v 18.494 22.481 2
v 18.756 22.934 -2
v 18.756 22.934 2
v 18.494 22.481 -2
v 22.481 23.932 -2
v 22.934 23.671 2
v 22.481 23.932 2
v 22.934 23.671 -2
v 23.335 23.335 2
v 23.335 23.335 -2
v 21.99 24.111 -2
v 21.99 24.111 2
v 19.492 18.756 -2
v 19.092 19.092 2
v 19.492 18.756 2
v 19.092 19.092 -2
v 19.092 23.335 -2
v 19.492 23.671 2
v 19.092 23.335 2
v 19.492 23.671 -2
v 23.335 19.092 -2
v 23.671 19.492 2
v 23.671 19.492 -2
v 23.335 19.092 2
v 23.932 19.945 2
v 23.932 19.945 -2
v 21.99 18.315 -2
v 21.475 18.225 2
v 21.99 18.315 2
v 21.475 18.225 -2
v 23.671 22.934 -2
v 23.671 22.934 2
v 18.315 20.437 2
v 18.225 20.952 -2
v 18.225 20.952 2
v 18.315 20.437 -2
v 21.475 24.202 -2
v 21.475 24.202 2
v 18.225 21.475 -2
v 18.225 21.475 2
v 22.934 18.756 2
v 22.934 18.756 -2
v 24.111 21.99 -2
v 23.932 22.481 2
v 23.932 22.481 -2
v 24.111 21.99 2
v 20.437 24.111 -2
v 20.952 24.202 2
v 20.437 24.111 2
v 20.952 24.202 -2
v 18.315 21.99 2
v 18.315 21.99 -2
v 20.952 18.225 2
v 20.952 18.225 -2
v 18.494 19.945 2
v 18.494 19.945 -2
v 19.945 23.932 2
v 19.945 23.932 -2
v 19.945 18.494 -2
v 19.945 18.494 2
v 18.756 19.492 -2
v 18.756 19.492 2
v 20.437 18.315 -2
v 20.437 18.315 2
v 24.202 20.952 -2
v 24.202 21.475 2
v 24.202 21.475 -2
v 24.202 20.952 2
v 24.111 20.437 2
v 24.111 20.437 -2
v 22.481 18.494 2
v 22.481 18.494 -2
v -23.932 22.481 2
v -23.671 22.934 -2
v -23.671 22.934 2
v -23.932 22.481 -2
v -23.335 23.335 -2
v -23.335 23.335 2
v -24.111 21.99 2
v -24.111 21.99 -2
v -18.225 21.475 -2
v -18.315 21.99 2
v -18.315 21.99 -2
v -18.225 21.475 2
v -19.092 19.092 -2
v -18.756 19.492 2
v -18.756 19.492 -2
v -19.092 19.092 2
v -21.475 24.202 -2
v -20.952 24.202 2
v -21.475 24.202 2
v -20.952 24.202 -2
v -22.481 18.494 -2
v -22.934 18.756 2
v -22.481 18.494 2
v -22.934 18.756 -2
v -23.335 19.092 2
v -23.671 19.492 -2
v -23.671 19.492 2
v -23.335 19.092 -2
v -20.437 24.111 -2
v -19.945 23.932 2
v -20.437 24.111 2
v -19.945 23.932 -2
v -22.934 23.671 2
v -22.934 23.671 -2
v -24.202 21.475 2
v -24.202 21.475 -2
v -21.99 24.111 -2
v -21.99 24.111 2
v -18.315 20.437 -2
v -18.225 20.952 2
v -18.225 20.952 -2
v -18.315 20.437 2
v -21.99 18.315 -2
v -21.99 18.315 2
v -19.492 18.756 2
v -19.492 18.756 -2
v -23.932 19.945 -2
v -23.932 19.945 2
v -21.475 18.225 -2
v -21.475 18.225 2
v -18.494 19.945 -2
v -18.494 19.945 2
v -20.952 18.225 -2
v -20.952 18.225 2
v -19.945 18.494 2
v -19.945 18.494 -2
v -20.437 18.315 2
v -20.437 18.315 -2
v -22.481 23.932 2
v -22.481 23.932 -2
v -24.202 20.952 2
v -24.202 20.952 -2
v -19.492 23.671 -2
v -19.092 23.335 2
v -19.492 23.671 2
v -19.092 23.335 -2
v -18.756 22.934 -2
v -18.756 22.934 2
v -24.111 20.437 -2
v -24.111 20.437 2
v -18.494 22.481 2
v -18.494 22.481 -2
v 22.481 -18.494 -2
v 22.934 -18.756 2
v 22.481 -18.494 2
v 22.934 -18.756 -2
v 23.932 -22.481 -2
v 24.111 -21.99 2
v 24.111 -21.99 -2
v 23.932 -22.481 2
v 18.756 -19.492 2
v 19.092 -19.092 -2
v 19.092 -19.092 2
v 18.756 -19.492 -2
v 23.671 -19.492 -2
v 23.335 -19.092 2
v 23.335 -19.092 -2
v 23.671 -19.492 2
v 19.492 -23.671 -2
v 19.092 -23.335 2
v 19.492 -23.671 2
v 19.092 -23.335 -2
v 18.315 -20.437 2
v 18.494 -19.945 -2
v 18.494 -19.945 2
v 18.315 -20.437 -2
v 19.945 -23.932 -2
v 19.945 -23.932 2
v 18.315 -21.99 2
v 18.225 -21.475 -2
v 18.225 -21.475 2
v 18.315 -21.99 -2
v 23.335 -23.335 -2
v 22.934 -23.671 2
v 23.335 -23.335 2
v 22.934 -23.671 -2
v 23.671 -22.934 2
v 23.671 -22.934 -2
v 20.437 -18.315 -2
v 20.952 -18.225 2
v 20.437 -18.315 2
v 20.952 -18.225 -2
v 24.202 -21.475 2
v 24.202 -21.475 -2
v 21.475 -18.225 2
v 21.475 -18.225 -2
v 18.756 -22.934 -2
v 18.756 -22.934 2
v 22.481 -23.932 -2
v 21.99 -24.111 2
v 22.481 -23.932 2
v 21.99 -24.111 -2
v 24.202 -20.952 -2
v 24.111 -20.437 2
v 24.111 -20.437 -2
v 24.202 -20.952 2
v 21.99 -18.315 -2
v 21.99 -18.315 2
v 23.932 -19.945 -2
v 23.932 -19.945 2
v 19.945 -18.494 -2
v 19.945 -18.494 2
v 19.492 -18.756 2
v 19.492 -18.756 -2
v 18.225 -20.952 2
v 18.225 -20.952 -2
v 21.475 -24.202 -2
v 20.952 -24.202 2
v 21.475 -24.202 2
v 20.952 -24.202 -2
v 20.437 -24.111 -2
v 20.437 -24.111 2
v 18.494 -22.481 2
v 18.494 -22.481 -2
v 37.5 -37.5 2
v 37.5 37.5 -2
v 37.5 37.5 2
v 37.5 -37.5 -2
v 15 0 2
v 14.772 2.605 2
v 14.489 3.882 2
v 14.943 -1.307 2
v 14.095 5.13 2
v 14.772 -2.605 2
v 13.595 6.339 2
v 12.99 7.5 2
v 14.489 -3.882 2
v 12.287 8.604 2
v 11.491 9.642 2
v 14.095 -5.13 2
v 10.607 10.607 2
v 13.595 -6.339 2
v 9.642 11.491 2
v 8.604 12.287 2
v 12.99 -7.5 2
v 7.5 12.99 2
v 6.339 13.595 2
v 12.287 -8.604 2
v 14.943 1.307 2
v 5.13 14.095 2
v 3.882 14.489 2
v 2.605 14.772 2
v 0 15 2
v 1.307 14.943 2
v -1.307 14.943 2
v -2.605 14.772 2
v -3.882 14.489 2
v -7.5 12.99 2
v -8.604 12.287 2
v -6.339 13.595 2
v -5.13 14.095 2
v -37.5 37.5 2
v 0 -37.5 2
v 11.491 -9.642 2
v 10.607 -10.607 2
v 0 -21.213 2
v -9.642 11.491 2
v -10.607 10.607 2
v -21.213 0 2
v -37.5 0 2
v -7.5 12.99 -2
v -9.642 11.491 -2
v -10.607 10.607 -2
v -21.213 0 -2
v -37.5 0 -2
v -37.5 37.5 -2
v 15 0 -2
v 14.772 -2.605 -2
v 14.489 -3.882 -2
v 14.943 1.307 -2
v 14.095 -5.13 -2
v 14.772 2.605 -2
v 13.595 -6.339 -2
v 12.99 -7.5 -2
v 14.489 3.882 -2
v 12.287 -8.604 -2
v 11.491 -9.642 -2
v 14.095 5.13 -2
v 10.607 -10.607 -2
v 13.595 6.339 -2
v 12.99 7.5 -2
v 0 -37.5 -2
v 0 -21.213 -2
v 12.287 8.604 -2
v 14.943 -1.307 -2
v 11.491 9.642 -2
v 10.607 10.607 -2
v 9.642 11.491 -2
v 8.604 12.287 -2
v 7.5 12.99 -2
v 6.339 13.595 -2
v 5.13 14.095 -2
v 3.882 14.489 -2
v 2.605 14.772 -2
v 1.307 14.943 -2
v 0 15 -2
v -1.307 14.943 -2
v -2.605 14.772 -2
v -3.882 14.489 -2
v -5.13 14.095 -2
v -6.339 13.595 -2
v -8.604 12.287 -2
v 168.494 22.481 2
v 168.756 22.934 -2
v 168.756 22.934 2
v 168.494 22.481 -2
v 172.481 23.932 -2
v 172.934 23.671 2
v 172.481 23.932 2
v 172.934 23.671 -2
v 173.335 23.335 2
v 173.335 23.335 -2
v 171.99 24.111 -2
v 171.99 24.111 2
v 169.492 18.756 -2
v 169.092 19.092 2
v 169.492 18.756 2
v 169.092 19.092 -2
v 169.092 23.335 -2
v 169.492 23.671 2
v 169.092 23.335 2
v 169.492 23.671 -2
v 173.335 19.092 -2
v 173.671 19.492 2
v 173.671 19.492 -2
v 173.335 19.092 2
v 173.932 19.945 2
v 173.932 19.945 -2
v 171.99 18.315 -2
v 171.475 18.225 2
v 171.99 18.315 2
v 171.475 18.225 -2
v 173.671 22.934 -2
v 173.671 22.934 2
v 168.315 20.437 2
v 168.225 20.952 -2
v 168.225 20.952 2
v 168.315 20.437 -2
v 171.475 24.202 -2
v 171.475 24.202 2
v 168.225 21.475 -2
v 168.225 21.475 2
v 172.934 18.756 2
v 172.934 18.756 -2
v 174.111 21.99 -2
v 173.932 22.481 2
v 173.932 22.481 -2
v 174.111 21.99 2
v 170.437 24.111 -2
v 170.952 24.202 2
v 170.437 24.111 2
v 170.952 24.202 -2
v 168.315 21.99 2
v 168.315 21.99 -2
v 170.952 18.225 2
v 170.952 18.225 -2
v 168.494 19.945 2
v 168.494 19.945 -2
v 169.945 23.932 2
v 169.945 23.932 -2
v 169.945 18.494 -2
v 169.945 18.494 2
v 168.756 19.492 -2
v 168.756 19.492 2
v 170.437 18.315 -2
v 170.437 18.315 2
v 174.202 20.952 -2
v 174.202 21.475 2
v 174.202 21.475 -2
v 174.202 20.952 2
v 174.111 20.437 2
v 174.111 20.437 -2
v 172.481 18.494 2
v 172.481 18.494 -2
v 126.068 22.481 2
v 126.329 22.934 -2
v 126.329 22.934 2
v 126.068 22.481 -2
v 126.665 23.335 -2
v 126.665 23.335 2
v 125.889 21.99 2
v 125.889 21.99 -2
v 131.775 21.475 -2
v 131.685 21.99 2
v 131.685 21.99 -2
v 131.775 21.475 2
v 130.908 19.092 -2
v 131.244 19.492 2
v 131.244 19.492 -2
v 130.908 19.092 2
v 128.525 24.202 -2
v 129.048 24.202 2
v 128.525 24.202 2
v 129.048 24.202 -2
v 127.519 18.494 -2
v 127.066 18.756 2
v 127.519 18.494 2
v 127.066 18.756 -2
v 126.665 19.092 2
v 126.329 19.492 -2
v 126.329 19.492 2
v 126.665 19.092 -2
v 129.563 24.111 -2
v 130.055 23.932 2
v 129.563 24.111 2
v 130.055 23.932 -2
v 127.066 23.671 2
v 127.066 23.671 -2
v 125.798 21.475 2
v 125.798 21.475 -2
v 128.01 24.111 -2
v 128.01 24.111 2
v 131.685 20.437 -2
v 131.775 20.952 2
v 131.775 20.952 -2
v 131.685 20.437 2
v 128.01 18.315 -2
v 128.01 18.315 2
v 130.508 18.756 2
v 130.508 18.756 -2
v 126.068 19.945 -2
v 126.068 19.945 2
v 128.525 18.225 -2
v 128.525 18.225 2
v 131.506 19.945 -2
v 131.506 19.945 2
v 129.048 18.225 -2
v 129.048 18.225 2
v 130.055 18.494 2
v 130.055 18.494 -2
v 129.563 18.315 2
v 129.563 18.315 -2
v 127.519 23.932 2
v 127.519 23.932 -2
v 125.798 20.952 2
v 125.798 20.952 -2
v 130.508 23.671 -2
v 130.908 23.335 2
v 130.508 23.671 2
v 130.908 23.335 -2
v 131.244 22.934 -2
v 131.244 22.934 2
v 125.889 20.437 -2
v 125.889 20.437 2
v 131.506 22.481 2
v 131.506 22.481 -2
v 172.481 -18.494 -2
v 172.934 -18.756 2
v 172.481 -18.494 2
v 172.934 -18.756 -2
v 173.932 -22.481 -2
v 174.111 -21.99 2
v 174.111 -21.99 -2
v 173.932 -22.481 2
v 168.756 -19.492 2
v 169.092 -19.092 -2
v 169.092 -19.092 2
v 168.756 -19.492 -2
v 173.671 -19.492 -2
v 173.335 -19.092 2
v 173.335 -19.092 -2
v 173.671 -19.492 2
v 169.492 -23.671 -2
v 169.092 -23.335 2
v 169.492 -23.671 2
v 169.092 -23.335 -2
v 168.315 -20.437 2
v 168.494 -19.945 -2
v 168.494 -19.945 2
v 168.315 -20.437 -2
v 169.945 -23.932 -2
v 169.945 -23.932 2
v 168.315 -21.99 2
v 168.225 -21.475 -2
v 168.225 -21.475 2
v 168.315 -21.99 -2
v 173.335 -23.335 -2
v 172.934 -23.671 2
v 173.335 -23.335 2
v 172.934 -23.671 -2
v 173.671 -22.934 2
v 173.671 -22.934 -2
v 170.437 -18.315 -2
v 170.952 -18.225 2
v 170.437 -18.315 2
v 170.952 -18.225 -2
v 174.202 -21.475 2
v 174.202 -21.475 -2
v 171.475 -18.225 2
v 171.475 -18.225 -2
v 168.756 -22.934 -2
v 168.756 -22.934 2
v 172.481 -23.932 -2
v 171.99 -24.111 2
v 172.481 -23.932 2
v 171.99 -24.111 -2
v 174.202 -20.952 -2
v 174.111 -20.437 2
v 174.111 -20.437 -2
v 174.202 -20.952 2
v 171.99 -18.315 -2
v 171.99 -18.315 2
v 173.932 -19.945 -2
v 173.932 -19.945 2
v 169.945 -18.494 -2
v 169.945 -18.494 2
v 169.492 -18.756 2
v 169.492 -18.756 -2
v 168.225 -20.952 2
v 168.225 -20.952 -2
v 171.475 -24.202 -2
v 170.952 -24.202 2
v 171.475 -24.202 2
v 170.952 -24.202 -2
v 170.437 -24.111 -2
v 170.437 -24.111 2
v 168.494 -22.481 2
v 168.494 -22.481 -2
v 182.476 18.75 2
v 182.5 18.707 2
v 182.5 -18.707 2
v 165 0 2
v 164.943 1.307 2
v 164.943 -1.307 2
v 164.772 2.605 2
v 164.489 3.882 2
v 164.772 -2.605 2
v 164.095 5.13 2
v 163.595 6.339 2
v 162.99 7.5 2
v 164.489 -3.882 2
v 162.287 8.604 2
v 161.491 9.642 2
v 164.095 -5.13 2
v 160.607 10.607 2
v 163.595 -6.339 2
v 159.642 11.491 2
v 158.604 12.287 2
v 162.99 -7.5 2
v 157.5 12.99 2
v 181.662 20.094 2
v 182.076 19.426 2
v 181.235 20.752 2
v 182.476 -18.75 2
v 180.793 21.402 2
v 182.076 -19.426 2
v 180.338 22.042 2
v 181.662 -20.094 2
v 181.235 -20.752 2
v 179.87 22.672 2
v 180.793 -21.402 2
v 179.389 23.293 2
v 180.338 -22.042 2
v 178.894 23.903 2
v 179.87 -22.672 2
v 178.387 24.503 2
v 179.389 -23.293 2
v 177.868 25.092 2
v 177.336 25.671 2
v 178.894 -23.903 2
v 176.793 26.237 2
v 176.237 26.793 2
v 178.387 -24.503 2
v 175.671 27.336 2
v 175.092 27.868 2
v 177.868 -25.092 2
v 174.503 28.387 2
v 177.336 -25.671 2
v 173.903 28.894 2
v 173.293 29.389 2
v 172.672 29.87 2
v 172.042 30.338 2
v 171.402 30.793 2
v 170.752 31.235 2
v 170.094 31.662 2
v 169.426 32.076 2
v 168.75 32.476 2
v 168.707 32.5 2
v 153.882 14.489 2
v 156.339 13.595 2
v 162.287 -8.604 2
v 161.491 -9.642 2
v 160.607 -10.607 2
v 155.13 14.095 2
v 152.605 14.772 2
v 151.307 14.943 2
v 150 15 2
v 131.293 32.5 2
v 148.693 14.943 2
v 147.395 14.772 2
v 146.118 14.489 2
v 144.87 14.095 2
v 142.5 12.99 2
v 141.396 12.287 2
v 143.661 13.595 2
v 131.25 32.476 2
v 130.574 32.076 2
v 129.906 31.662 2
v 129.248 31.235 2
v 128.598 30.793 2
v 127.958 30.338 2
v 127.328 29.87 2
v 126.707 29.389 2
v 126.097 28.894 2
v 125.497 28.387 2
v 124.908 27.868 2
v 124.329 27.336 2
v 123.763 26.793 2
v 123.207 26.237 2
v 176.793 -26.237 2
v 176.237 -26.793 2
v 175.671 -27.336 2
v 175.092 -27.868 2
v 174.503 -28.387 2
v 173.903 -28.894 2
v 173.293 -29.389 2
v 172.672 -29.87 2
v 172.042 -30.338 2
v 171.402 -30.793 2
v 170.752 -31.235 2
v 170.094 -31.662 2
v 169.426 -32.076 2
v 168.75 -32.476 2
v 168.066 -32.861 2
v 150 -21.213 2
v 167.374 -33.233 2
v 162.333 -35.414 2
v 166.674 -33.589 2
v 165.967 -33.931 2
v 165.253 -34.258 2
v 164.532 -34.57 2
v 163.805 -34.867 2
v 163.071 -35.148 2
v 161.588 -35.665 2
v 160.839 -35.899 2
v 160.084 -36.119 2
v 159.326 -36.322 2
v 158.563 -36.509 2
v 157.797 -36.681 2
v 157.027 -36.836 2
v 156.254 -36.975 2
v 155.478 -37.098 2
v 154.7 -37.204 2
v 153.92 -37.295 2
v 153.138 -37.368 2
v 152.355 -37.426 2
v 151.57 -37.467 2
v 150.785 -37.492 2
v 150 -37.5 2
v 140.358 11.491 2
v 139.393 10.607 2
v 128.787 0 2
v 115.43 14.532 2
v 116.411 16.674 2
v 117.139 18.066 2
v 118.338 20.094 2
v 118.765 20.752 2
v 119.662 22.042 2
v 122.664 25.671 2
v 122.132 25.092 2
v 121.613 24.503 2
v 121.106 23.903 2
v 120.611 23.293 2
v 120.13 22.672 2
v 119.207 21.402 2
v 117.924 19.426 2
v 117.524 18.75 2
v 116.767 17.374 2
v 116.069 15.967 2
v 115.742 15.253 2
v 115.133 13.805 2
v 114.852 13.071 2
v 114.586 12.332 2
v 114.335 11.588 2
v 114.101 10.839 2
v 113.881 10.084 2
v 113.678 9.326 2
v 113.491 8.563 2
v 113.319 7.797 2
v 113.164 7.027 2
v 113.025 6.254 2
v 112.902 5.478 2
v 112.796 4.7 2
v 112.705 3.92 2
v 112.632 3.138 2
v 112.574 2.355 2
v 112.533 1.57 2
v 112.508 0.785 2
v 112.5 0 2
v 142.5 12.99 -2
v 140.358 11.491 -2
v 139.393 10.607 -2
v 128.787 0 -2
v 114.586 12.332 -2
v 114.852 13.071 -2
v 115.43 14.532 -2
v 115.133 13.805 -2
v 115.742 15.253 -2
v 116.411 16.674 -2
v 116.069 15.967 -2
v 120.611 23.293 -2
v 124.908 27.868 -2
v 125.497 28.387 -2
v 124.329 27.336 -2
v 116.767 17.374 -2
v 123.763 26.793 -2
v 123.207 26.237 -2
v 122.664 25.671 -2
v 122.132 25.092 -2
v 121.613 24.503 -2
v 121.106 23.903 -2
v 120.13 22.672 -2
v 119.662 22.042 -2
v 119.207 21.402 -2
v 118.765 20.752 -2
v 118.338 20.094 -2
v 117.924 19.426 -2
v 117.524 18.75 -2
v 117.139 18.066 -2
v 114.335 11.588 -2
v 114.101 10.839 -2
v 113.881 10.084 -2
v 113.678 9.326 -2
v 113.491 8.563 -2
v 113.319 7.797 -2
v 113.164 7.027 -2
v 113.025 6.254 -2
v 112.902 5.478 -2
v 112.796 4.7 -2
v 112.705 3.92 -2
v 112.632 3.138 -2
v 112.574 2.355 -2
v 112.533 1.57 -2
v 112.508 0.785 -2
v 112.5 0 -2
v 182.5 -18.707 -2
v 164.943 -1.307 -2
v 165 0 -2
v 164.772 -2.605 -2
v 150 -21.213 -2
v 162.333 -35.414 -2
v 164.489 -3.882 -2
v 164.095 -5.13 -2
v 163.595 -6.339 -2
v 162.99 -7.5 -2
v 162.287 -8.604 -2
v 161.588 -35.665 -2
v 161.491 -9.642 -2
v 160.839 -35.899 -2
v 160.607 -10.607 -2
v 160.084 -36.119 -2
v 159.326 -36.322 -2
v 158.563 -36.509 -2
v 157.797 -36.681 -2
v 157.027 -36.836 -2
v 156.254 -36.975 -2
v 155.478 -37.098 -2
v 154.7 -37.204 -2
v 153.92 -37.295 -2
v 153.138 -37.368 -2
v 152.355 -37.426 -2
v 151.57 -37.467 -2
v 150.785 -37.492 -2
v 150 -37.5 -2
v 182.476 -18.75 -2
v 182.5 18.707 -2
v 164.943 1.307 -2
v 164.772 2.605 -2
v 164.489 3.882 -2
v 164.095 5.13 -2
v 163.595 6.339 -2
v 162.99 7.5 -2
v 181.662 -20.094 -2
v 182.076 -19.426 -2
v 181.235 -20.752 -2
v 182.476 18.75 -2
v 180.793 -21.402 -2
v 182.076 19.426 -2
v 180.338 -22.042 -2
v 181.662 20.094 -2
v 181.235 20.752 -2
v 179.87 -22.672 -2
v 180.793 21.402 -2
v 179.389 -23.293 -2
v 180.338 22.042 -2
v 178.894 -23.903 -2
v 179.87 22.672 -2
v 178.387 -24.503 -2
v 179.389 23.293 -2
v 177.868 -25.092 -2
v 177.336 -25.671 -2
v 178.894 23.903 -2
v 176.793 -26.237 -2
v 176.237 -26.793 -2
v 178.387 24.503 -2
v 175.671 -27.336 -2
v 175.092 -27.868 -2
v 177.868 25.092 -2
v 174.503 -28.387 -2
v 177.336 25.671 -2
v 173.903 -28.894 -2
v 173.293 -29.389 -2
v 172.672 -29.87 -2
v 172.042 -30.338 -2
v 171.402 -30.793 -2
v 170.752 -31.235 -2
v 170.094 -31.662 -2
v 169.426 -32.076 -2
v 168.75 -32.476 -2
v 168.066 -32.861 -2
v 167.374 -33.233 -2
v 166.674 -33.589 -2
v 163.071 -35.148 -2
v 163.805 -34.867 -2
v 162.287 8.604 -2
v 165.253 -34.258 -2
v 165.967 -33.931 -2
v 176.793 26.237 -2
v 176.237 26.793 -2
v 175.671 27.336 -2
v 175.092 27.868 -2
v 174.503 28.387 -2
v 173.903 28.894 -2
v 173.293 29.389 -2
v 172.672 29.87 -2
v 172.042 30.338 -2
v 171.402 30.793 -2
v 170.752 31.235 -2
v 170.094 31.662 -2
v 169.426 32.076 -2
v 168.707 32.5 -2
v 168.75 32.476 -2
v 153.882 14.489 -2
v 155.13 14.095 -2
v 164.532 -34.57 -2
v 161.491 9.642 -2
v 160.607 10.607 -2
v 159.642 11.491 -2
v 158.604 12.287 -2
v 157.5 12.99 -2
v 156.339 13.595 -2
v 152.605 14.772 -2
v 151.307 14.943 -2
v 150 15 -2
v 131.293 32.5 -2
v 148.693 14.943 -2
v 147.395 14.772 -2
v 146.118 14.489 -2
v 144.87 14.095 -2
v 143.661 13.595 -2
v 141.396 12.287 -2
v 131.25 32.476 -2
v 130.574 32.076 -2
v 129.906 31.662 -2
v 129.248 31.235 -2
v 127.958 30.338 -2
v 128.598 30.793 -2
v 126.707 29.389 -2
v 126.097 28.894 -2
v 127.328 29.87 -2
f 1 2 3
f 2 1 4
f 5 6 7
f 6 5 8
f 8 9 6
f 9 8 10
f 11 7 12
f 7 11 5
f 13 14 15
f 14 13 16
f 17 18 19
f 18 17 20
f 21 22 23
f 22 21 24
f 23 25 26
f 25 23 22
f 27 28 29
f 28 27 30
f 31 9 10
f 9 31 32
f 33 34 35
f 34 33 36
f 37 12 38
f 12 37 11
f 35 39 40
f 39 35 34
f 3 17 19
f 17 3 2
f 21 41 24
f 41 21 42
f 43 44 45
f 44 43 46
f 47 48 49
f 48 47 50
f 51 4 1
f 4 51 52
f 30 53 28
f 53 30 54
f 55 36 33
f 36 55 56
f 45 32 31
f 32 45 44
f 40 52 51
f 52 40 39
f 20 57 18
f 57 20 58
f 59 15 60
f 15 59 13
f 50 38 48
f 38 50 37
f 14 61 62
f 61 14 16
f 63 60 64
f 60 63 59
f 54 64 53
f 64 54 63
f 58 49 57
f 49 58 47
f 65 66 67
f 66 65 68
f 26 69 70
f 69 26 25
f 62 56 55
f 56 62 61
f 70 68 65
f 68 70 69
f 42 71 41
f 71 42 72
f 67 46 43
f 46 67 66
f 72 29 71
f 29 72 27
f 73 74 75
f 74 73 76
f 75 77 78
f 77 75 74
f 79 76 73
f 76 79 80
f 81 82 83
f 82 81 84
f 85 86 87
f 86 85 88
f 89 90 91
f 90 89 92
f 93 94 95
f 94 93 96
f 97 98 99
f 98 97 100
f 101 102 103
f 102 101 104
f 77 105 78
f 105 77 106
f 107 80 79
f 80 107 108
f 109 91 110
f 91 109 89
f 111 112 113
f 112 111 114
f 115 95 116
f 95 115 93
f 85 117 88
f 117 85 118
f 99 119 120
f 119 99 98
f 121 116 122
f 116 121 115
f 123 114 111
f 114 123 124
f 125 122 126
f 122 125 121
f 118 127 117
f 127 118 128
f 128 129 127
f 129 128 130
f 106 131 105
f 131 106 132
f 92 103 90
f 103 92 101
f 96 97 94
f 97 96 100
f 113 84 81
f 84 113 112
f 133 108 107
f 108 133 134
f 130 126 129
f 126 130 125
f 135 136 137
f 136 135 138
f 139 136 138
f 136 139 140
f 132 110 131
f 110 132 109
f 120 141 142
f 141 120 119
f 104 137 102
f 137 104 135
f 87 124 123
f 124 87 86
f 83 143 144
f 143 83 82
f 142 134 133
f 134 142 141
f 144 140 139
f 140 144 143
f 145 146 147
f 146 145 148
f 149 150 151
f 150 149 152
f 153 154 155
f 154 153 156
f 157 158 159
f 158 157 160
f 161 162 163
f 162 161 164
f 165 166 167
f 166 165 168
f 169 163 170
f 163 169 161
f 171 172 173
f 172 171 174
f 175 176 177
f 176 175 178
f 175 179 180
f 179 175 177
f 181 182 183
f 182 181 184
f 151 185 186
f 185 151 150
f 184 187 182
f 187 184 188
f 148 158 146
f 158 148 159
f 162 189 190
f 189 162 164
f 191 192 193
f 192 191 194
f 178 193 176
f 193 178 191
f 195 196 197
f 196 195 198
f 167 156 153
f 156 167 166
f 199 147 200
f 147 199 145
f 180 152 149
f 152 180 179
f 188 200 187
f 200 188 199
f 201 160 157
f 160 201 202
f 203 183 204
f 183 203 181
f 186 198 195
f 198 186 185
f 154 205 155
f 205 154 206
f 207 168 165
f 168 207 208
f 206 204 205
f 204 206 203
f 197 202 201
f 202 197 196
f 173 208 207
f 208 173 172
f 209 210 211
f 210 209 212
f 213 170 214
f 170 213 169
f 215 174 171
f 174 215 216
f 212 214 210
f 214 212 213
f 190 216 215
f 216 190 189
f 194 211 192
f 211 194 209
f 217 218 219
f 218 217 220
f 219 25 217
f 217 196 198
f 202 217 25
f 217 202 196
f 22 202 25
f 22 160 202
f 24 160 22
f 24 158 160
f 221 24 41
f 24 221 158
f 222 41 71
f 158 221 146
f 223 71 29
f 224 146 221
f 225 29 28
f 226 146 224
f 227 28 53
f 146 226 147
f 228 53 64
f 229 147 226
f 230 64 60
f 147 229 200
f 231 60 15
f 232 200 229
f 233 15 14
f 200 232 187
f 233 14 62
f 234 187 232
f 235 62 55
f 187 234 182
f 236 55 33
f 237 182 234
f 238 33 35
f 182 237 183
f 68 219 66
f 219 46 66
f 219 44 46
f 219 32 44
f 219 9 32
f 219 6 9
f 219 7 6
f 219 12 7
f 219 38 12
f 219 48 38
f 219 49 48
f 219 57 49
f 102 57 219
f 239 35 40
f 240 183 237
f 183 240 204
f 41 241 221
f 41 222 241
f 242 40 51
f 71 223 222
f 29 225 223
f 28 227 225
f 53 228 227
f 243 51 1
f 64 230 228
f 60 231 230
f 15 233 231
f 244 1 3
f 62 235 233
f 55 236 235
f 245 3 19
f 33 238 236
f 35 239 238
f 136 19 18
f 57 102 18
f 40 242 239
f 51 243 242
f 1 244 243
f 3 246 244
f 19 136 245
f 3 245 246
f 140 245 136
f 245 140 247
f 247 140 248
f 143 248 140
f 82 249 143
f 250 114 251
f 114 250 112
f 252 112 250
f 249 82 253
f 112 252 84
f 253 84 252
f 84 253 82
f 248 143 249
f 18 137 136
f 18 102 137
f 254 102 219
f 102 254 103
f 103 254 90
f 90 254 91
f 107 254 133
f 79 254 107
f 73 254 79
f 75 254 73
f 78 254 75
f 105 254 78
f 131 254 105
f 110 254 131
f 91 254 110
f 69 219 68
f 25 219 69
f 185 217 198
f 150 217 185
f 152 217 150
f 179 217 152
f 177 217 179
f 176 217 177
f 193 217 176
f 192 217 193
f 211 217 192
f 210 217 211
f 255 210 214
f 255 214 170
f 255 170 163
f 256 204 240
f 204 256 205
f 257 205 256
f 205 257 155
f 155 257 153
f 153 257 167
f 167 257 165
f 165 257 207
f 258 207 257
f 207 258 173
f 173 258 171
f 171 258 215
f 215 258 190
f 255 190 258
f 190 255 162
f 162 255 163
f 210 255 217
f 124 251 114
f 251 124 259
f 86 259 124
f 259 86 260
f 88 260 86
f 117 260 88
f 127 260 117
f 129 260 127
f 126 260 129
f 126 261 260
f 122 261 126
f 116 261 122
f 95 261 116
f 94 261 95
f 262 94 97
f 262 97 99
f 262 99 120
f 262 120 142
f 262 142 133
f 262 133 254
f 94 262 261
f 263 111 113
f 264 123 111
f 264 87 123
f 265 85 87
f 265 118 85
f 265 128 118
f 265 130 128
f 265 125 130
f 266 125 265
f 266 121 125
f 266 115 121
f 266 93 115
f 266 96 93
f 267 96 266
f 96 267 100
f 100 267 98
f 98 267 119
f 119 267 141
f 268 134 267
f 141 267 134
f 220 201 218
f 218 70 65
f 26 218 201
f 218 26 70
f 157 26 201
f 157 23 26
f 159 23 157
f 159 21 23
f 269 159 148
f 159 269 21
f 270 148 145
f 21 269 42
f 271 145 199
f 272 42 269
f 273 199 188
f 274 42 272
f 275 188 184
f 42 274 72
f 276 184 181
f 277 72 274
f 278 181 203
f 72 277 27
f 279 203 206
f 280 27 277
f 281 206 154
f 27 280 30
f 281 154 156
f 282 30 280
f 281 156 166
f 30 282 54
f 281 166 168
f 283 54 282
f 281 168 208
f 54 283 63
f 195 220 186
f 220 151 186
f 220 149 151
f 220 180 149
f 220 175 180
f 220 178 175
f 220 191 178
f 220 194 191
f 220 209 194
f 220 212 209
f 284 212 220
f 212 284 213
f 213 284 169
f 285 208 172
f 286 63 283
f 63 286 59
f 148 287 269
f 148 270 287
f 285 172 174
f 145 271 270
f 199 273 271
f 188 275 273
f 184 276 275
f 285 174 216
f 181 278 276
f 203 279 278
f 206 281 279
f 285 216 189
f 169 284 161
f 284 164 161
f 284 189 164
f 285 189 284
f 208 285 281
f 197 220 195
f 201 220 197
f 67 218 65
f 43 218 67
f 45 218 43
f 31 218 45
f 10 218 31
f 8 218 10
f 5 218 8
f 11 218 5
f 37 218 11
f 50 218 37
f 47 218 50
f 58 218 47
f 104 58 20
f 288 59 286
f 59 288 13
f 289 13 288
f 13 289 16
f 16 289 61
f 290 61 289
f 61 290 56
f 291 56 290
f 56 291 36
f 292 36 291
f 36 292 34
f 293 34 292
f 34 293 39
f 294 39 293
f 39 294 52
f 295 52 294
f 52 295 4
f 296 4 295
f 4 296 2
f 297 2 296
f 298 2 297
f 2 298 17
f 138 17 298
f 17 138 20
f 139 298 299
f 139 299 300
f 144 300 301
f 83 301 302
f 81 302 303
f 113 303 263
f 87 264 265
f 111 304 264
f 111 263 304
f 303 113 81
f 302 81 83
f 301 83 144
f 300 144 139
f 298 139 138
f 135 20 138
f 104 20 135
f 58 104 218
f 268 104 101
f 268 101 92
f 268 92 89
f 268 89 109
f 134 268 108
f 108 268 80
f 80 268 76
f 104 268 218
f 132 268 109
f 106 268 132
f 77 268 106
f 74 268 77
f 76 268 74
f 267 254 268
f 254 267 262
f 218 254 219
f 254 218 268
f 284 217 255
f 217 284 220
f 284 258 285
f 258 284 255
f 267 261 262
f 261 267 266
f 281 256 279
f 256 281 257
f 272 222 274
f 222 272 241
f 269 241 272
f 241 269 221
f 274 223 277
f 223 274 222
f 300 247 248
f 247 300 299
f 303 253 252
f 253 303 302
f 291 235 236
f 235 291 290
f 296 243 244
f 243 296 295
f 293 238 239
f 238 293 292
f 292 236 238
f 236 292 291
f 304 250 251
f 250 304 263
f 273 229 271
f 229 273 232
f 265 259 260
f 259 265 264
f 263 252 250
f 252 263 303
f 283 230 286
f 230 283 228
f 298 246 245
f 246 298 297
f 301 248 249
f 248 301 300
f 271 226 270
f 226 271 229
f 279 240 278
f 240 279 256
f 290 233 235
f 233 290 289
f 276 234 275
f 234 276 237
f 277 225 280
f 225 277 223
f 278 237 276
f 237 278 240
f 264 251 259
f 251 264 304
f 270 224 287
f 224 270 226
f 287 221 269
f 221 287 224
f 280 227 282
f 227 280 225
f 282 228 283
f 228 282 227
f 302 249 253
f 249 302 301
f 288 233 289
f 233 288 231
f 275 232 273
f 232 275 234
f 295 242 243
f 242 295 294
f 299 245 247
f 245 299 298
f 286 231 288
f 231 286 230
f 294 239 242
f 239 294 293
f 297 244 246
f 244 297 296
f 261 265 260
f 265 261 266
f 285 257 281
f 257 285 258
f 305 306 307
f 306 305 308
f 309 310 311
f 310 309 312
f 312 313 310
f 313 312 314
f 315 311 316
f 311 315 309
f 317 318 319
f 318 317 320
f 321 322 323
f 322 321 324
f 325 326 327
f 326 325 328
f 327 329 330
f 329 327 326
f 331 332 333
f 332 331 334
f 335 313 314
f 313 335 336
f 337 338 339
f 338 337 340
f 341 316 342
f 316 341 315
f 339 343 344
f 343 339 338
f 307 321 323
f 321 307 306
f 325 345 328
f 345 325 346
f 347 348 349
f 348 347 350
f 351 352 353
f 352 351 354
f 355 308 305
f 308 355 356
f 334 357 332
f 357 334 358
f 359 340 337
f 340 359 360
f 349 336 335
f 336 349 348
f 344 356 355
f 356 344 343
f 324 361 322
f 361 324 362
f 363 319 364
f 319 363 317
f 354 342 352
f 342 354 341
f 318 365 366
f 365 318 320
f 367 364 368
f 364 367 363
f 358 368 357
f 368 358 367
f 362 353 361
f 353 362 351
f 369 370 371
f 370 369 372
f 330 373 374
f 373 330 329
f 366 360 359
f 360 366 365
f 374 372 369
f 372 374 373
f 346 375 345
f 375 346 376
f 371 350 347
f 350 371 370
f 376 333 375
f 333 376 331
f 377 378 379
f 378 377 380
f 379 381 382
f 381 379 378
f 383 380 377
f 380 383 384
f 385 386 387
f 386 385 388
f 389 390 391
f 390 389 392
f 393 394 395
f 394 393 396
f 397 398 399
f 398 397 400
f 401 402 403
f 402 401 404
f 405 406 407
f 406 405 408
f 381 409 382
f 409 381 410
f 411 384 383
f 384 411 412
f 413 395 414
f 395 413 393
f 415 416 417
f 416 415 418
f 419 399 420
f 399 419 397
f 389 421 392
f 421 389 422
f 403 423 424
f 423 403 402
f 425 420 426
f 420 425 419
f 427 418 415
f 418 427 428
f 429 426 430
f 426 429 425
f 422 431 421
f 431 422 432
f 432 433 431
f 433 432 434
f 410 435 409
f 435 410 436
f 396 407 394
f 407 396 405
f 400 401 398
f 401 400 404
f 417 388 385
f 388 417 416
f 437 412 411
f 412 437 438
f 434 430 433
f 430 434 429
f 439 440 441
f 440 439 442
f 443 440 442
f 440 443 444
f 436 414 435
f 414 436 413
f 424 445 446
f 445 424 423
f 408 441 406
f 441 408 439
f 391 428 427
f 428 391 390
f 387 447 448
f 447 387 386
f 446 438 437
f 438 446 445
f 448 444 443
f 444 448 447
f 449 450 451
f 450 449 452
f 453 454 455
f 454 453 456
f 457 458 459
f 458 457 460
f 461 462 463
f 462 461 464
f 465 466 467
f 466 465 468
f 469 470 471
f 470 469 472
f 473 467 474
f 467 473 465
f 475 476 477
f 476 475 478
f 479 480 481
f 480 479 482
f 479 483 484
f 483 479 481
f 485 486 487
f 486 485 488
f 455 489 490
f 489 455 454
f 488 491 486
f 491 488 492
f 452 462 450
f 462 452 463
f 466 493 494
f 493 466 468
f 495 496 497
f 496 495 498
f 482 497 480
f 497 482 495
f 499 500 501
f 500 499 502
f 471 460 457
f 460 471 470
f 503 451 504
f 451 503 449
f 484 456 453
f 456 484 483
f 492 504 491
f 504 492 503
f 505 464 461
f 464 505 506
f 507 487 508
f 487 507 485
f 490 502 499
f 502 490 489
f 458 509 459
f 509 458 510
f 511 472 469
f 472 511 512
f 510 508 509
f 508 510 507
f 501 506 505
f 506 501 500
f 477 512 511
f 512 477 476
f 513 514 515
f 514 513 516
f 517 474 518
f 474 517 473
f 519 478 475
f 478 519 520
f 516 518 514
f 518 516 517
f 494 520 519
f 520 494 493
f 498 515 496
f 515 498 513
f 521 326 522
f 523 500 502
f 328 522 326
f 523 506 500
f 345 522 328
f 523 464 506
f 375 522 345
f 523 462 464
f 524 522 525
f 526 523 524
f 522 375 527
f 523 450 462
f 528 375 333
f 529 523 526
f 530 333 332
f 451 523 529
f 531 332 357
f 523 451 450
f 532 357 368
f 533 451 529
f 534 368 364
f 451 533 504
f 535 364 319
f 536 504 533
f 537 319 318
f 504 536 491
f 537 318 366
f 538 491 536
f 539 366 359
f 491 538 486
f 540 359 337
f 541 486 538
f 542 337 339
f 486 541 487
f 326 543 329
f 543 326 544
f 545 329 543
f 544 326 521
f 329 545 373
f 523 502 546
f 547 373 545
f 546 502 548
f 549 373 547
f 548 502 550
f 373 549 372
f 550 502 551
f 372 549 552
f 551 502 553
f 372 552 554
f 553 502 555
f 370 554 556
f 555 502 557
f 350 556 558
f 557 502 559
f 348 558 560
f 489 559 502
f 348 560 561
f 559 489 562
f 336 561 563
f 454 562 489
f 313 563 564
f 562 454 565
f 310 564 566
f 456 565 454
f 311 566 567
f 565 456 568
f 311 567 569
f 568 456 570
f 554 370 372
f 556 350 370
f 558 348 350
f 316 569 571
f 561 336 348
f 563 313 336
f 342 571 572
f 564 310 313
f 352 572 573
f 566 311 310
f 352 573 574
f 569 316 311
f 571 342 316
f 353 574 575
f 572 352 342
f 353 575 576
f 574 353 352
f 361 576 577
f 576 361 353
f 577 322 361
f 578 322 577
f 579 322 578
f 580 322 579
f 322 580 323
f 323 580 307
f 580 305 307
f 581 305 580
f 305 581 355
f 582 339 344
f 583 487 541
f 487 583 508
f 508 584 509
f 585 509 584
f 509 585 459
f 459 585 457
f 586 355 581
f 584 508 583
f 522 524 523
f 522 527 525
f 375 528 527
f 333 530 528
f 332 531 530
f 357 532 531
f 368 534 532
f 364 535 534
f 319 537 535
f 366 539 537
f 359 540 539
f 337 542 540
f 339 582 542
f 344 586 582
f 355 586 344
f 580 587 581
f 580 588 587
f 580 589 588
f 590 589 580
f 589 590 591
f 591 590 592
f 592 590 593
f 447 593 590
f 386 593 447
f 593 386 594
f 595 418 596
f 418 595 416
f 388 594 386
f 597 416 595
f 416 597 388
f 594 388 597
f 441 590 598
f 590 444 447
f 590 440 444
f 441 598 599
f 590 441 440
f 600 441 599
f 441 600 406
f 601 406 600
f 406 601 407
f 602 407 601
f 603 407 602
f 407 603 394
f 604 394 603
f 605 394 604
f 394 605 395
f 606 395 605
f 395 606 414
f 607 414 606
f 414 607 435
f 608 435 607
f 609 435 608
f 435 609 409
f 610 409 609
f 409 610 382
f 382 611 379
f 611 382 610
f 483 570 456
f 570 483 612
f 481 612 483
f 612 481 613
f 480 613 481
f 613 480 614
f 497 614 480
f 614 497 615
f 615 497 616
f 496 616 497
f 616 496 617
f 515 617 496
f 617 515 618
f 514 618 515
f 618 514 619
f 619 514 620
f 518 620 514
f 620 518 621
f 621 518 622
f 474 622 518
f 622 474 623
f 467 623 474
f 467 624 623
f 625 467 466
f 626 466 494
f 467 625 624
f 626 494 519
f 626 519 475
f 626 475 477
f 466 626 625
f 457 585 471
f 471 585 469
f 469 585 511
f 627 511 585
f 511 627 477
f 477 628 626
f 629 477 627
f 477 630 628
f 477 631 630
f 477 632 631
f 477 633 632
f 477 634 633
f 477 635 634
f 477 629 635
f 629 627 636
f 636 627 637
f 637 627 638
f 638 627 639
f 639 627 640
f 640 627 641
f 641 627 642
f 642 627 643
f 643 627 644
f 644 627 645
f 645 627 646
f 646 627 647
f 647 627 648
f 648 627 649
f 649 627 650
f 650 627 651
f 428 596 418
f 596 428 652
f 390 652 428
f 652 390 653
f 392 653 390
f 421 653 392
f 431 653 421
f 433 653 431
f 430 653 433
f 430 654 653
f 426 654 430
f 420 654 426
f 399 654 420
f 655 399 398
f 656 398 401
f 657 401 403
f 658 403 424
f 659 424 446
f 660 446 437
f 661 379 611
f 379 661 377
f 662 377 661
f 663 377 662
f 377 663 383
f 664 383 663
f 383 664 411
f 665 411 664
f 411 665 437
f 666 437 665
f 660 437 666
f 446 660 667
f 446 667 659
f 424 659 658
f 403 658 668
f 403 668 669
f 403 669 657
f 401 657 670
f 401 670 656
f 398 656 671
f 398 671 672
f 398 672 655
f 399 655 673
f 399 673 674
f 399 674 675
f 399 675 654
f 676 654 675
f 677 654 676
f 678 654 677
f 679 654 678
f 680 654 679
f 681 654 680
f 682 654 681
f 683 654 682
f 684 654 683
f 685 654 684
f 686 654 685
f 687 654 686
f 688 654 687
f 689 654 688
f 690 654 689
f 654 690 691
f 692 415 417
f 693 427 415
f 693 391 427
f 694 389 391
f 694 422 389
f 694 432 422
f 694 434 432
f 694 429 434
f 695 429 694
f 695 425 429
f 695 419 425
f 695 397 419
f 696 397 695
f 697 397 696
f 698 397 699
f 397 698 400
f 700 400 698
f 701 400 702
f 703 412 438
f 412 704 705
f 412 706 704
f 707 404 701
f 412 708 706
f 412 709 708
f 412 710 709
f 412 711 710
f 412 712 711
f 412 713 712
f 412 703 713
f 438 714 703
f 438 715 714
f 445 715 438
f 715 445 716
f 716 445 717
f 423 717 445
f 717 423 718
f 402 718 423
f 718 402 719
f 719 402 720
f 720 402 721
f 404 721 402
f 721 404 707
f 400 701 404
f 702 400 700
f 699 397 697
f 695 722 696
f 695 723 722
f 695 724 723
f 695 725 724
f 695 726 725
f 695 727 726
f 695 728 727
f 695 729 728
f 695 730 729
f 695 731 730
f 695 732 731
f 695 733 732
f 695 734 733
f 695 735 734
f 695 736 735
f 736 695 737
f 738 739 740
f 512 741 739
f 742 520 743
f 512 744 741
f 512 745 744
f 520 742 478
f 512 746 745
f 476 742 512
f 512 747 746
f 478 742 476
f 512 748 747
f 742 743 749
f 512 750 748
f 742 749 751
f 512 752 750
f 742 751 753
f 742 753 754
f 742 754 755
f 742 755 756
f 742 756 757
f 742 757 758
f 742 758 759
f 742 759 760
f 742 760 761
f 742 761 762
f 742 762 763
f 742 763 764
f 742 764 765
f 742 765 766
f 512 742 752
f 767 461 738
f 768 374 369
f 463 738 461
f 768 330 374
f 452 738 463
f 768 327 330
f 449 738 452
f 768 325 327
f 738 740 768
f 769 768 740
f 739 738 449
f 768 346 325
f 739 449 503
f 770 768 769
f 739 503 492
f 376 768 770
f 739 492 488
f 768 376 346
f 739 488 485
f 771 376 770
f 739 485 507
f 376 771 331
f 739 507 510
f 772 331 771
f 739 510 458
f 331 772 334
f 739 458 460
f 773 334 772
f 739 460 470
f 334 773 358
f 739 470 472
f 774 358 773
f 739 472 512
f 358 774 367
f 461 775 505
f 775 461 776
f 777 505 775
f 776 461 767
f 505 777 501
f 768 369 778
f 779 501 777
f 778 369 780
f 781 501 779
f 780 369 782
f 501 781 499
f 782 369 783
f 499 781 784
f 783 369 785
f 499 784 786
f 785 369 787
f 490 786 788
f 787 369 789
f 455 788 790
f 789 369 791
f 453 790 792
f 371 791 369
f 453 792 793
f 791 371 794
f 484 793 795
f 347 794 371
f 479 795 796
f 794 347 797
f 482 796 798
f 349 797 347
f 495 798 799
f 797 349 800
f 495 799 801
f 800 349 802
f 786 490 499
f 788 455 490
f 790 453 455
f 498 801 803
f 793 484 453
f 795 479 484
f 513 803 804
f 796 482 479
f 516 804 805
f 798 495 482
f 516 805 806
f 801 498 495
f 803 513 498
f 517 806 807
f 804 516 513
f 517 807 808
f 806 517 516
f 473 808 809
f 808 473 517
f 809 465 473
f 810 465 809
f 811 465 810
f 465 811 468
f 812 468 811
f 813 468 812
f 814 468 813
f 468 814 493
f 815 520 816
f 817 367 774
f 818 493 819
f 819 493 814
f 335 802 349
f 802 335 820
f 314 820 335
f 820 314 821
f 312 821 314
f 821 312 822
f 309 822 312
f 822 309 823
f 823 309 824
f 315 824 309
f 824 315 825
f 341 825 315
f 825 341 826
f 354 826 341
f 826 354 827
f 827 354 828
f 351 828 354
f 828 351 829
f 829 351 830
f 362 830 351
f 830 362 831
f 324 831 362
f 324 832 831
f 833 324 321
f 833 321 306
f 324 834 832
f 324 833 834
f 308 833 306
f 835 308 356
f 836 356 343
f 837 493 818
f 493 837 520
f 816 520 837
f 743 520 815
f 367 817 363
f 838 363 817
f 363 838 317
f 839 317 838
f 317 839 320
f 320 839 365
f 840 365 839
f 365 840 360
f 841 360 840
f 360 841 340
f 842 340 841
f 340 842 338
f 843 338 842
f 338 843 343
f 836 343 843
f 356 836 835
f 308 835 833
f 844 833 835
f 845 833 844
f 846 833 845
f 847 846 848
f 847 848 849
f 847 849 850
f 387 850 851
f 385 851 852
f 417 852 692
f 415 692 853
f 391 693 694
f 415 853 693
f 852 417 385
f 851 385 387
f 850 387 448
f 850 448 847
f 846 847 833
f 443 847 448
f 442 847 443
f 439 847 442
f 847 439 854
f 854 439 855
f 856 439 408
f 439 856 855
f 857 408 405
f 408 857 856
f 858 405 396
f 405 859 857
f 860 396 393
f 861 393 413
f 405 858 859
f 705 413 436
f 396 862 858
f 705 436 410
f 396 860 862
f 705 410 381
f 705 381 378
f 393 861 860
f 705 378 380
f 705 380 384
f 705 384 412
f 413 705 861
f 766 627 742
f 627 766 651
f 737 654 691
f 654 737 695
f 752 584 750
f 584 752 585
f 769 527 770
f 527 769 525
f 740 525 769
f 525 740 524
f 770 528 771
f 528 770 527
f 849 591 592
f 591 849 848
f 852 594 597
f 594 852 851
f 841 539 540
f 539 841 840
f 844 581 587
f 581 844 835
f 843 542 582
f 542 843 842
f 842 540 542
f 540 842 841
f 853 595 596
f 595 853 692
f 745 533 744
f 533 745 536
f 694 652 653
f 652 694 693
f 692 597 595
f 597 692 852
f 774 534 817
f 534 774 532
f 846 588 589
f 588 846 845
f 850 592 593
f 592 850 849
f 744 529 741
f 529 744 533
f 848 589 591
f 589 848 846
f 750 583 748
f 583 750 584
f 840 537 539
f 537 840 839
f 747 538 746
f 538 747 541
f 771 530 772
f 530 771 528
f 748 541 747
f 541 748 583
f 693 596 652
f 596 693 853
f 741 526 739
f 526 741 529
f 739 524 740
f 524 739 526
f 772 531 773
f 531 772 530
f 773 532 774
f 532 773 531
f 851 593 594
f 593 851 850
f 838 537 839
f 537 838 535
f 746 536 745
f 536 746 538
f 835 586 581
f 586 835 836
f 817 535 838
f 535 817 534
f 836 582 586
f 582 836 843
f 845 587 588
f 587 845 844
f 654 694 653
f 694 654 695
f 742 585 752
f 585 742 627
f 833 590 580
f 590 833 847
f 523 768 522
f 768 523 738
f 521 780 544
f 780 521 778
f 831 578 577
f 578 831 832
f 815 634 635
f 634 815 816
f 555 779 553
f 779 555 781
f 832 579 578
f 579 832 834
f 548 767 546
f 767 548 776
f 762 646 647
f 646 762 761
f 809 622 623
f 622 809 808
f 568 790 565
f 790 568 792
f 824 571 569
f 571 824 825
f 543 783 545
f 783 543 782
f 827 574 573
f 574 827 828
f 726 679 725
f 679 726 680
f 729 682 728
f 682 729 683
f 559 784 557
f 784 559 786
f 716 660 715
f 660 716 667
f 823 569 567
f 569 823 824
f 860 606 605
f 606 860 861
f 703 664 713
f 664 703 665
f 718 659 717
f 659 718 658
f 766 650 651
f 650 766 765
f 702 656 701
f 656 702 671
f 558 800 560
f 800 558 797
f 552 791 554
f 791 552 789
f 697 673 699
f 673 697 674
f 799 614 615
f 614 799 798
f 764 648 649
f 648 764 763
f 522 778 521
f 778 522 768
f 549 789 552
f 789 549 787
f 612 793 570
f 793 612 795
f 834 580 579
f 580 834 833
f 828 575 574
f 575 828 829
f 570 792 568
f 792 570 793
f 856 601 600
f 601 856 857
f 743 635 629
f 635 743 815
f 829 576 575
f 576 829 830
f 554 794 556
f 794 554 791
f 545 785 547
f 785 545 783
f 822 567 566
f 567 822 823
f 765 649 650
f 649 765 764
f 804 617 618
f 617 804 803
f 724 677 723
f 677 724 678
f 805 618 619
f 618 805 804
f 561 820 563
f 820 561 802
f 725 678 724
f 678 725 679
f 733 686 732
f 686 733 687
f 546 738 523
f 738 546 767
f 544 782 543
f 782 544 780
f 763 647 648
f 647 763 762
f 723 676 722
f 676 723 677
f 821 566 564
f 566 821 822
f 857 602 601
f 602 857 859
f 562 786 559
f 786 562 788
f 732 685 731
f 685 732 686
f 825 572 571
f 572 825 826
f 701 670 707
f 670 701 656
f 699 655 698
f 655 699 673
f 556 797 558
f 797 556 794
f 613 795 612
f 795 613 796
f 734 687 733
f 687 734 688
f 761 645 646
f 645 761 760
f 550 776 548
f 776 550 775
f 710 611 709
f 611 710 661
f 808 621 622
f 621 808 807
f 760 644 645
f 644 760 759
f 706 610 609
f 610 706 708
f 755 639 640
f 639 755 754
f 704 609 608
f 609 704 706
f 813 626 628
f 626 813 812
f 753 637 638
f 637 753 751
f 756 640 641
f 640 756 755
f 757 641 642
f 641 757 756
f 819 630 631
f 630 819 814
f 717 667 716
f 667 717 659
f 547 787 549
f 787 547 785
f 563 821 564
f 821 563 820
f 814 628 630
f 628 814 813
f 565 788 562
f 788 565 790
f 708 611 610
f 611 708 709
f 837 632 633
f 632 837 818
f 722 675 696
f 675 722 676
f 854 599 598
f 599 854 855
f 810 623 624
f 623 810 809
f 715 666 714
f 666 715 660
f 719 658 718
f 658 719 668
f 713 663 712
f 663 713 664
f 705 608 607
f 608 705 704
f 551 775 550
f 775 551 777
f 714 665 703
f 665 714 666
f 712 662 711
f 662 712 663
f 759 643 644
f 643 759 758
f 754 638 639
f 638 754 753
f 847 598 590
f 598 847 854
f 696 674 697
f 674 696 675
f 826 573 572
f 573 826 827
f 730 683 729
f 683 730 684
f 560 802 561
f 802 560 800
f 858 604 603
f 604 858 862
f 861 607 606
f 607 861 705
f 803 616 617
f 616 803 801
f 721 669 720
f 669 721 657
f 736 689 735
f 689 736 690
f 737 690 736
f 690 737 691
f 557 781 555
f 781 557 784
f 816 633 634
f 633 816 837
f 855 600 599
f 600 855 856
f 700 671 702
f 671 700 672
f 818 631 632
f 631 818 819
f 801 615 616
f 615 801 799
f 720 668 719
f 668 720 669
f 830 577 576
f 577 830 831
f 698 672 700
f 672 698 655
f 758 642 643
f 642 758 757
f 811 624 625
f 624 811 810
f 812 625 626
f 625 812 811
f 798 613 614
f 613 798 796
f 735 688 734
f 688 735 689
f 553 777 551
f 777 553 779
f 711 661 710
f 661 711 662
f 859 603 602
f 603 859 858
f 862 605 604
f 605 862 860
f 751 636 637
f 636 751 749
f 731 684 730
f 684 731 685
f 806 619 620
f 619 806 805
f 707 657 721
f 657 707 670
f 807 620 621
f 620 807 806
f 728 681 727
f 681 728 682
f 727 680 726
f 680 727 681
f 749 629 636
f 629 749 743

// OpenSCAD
difference() {
  cube(size=[75, 75, 4], center=true);
  translate([-37.5, -37.5, 0]) cube(size=[75, 75, 4.1], center=true);
  cylinder(r=15, h=10, center=true, $fn=72);
  rotate([0, 0, 45]) translate([-15, 0, 0]) cube(size=[30, 30, 10], center=true);
  for (a=[45,135,315]) {
    rotate([0, 0, a]) translate([30, 0, 0]) cylinder(r=3, h=10, center=true, $fn=36);
  }
  
}


translate([150, 0, 0]) intersection() {
  cylinder(r=37.5, h=5, center=true, $fn=300);
  difference() {
    cube(size=[75, 75, 4], center=true);
    translate([-37.5, -37.5, 0]) cube(size=[75, 75, 4.1], center=true);
    cylinder(r=15, h=10, center=true, $fn=72);
    rotate([0, 0, 45]) translate([-15, 0, 0]) cube(size=[30, 30, 10], center=true);
    for (a=[45,135,315]) {
      rotate([0, 0, a]) translate([30, 0, 0]) cylinder(r=3, h=10, center=true, $fn=36);
    }
    translate([0, 37.5, 0]) cube(size=[76, 10, 10], center=true);
    rotate([0, 0, -90]) translate([0, 37.5, 0]) cube(size=[76, 10, 10], center=true);
    // rotate([0, 0, -45]) translate([0, 45, 0]) cube(size=[40, 15, 10], center=true);
  }
}
